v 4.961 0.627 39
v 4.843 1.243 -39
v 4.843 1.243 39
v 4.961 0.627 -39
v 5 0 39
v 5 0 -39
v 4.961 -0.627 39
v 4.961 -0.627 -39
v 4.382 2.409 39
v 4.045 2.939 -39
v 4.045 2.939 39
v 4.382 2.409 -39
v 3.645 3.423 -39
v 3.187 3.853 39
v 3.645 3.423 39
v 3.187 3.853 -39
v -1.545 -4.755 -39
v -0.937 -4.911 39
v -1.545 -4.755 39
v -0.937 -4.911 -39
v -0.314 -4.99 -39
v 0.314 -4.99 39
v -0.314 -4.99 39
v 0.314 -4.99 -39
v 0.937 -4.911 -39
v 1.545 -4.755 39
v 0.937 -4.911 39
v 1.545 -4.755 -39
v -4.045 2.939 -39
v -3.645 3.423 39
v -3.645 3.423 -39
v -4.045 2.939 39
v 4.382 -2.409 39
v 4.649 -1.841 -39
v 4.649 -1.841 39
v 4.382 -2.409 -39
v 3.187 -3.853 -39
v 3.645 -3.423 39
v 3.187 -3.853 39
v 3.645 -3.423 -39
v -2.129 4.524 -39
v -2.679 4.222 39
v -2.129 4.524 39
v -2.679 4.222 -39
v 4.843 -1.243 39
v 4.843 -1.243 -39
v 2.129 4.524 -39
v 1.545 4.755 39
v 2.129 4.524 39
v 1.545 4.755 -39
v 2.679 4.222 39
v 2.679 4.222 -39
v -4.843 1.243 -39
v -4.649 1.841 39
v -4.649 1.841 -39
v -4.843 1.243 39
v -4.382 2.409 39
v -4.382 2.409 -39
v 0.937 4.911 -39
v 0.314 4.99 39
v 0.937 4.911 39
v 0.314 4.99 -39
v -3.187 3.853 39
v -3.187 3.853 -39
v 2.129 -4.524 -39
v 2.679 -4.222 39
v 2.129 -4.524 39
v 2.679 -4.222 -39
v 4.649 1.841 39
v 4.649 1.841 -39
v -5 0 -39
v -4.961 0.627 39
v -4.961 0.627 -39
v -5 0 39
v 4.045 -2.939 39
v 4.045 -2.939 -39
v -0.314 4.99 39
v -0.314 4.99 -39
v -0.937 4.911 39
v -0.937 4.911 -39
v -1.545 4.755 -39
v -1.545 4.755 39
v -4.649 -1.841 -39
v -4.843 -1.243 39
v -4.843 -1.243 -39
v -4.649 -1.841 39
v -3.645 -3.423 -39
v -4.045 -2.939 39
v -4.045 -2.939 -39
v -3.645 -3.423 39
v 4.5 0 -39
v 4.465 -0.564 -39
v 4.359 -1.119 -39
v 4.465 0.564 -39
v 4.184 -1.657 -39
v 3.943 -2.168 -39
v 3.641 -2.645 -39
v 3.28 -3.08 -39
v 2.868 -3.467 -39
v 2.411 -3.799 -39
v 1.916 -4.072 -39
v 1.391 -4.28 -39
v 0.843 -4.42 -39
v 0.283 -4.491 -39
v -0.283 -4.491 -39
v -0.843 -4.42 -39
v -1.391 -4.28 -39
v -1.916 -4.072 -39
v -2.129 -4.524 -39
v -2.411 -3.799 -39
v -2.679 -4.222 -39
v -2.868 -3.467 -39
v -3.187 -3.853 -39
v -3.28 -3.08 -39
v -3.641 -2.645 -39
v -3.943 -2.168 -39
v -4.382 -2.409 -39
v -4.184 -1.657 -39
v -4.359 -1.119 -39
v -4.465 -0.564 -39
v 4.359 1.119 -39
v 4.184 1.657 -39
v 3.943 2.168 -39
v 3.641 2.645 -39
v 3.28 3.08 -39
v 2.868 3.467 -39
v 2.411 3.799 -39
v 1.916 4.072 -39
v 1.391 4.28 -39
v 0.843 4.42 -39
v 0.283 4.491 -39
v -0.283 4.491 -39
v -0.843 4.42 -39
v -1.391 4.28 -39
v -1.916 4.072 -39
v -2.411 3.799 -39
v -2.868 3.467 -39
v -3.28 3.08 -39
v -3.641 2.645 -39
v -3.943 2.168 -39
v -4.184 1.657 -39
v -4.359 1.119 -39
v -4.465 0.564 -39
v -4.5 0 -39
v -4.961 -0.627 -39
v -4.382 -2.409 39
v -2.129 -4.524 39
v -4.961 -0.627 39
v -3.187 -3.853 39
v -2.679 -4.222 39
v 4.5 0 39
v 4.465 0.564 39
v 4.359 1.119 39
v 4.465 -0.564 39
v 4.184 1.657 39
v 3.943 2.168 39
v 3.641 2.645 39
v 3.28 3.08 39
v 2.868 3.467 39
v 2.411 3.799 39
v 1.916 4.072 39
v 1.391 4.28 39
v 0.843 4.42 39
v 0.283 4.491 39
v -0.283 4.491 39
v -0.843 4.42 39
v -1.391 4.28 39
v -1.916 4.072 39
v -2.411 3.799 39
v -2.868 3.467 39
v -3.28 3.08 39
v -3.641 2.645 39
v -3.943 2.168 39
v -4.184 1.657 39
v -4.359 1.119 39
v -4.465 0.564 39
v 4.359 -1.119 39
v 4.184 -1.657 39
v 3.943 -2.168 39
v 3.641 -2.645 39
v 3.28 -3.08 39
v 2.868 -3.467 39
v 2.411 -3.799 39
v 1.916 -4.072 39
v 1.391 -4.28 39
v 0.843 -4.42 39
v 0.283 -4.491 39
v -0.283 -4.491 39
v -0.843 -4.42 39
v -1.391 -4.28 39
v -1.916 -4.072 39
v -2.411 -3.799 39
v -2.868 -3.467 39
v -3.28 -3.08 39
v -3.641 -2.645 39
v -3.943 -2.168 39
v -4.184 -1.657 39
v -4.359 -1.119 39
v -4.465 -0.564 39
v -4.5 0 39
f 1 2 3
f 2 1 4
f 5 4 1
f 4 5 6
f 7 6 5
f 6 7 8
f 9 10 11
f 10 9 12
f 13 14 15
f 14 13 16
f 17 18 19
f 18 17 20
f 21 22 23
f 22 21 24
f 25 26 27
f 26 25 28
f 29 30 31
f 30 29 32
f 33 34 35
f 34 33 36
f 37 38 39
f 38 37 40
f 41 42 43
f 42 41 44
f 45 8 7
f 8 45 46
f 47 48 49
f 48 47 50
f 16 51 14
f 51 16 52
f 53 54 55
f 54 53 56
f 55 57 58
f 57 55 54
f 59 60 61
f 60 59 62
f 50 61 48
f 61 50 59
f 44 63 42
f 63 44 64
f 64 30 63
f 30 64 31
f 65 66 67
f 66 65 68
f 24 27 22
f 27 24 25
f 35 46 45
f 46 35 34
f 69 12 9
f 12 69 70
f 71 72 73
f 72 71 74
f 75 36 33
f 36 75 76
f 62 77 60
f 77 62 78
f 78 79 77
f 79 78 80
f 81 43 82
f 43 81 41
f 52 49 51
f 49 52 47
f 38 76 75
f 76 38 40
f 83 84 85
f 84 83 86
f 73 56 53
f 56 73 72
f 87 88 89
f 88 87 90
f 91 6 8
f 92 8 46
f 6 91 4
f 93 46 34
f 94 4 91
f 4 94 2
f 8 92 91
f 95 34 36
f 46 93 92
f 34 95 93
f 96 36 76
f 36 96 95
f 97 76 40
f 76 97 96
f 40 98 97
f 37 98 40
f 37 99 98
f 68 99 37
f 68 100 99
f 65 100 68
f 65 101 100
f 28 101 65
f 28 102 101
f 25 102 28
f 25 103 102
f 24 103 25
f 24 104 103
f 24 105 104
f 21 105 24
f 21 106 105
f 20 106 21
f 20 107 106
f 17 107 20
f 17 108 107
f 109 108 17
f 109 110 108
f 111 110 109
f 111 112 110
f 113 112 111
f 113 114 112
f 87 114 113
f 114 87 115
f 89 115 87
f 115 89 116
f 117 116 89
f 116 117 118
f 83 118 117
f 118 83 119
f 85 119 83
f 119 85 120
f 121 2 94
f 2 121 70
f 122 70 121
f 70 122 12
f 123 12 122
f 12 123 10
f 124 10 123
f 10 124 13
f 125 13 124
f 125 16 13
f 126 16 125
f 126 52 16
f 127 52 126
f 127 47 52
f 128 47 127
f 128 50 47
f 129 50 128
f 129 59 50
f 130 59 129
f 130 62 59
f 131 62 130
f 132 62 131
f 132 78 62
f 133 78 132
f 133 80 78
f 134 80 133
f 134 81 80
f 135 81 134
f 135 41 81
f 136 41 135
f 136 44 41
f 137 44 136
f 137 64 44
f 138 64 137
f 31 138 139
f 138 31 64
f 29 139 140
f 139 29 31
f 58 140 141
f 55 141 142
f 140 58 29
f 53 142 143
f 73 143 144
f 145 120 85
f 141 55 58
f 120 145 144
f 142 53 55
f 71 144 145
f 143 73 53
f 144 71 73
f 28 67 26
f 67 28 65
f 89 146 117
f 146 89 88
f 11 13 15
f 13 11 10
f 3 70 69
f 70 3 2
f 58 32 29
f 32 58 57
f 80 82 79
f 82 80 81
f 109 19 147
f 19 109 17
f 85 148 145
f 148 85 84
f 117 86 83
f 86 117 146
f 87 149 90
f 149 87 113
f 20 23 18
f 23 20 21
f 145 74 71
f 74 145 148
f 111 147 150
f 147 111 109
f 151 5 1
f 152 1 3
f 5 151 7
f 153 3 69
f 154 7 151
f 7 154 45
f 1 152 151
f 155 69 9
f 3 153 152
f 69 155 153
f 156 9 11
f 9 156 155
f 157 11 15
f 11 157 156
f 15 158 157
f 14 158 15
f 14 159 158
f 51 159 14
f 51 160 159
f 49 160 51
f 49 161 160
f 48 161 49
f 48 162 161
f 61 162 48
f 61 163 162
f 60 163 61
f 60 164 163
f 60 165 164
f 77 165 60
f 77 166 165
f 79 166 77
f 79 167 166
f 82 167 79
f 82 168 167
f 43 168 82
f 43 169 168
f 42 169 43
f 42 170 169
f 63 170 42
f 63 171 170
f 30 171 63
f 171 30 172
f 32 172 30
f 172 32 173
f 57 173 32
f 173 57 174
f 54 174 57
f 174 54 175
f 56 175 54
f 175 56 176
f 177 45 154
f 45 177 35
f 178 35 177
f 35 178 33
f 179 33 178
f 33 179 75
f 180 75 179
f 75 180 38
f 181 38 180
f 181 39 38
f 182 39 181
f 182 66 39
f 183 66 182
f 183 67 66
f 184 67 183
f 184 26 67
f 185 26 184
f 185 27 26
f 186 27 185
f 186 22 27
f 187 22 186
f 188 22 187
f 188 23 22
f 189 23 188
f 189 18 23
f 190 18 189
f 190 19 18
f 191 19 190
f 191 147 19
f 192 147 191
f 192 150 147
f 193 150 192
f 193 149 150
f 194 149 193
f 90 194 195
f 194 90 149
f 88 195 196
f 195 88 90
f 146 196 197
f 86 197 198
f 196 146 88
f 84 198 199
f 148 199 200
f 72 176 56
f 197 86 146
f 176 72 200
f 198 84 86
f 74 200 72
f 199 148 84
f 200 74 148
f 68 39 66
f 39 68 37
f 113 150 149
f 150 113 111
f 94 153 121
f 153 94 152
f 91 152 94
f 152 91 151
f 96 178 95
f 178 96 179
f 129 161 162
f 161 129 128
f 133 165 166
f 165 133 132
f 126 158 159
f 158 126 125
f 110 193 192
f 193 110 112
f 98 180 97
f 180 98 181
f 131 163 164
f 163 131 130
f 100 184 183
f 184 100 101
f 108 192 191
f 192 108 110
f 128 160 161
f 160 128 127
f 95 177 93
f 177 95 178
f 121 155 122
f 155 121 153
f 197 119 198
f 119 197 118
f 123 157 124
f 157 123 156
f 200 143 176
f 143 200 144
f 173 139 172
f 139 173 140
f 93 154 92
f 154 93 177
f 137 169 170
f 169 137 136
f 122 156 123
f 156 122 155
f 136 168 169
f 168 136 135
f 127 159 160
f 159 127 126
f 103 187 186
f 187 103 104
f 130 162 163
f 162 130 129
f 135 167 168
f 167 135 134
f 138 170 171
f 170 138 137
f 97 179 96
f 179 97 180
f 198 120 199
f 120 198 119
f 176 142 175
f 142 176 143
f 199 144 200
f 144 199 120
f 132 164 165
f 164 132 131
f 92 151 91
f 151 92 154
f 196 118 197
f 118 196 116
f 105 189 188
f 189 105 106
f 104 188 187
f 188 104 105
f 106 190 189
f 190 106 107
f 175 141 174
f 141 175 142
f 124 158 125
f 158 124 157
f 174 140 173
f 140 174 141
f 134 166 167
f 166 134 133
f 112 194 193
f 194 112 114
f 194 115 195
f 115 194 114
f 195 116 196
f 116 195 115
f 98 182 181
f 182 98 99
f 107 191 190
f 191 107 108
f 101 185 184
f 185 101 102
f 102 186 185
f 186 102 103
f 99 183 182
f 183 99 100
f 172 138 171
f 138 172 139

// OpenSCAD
$fn = 50;


difference() {
	union() {
		translate(v = [0, 0, -39.0000000000]) {
			cylinder(h = 78, r = 5.0000000000);
		}
	}
	union() {
		translate(v = [0, 0, -100.0000000000]) {
			cylinder(h = 200, r = 4.5000000000);
		}
	}
}
